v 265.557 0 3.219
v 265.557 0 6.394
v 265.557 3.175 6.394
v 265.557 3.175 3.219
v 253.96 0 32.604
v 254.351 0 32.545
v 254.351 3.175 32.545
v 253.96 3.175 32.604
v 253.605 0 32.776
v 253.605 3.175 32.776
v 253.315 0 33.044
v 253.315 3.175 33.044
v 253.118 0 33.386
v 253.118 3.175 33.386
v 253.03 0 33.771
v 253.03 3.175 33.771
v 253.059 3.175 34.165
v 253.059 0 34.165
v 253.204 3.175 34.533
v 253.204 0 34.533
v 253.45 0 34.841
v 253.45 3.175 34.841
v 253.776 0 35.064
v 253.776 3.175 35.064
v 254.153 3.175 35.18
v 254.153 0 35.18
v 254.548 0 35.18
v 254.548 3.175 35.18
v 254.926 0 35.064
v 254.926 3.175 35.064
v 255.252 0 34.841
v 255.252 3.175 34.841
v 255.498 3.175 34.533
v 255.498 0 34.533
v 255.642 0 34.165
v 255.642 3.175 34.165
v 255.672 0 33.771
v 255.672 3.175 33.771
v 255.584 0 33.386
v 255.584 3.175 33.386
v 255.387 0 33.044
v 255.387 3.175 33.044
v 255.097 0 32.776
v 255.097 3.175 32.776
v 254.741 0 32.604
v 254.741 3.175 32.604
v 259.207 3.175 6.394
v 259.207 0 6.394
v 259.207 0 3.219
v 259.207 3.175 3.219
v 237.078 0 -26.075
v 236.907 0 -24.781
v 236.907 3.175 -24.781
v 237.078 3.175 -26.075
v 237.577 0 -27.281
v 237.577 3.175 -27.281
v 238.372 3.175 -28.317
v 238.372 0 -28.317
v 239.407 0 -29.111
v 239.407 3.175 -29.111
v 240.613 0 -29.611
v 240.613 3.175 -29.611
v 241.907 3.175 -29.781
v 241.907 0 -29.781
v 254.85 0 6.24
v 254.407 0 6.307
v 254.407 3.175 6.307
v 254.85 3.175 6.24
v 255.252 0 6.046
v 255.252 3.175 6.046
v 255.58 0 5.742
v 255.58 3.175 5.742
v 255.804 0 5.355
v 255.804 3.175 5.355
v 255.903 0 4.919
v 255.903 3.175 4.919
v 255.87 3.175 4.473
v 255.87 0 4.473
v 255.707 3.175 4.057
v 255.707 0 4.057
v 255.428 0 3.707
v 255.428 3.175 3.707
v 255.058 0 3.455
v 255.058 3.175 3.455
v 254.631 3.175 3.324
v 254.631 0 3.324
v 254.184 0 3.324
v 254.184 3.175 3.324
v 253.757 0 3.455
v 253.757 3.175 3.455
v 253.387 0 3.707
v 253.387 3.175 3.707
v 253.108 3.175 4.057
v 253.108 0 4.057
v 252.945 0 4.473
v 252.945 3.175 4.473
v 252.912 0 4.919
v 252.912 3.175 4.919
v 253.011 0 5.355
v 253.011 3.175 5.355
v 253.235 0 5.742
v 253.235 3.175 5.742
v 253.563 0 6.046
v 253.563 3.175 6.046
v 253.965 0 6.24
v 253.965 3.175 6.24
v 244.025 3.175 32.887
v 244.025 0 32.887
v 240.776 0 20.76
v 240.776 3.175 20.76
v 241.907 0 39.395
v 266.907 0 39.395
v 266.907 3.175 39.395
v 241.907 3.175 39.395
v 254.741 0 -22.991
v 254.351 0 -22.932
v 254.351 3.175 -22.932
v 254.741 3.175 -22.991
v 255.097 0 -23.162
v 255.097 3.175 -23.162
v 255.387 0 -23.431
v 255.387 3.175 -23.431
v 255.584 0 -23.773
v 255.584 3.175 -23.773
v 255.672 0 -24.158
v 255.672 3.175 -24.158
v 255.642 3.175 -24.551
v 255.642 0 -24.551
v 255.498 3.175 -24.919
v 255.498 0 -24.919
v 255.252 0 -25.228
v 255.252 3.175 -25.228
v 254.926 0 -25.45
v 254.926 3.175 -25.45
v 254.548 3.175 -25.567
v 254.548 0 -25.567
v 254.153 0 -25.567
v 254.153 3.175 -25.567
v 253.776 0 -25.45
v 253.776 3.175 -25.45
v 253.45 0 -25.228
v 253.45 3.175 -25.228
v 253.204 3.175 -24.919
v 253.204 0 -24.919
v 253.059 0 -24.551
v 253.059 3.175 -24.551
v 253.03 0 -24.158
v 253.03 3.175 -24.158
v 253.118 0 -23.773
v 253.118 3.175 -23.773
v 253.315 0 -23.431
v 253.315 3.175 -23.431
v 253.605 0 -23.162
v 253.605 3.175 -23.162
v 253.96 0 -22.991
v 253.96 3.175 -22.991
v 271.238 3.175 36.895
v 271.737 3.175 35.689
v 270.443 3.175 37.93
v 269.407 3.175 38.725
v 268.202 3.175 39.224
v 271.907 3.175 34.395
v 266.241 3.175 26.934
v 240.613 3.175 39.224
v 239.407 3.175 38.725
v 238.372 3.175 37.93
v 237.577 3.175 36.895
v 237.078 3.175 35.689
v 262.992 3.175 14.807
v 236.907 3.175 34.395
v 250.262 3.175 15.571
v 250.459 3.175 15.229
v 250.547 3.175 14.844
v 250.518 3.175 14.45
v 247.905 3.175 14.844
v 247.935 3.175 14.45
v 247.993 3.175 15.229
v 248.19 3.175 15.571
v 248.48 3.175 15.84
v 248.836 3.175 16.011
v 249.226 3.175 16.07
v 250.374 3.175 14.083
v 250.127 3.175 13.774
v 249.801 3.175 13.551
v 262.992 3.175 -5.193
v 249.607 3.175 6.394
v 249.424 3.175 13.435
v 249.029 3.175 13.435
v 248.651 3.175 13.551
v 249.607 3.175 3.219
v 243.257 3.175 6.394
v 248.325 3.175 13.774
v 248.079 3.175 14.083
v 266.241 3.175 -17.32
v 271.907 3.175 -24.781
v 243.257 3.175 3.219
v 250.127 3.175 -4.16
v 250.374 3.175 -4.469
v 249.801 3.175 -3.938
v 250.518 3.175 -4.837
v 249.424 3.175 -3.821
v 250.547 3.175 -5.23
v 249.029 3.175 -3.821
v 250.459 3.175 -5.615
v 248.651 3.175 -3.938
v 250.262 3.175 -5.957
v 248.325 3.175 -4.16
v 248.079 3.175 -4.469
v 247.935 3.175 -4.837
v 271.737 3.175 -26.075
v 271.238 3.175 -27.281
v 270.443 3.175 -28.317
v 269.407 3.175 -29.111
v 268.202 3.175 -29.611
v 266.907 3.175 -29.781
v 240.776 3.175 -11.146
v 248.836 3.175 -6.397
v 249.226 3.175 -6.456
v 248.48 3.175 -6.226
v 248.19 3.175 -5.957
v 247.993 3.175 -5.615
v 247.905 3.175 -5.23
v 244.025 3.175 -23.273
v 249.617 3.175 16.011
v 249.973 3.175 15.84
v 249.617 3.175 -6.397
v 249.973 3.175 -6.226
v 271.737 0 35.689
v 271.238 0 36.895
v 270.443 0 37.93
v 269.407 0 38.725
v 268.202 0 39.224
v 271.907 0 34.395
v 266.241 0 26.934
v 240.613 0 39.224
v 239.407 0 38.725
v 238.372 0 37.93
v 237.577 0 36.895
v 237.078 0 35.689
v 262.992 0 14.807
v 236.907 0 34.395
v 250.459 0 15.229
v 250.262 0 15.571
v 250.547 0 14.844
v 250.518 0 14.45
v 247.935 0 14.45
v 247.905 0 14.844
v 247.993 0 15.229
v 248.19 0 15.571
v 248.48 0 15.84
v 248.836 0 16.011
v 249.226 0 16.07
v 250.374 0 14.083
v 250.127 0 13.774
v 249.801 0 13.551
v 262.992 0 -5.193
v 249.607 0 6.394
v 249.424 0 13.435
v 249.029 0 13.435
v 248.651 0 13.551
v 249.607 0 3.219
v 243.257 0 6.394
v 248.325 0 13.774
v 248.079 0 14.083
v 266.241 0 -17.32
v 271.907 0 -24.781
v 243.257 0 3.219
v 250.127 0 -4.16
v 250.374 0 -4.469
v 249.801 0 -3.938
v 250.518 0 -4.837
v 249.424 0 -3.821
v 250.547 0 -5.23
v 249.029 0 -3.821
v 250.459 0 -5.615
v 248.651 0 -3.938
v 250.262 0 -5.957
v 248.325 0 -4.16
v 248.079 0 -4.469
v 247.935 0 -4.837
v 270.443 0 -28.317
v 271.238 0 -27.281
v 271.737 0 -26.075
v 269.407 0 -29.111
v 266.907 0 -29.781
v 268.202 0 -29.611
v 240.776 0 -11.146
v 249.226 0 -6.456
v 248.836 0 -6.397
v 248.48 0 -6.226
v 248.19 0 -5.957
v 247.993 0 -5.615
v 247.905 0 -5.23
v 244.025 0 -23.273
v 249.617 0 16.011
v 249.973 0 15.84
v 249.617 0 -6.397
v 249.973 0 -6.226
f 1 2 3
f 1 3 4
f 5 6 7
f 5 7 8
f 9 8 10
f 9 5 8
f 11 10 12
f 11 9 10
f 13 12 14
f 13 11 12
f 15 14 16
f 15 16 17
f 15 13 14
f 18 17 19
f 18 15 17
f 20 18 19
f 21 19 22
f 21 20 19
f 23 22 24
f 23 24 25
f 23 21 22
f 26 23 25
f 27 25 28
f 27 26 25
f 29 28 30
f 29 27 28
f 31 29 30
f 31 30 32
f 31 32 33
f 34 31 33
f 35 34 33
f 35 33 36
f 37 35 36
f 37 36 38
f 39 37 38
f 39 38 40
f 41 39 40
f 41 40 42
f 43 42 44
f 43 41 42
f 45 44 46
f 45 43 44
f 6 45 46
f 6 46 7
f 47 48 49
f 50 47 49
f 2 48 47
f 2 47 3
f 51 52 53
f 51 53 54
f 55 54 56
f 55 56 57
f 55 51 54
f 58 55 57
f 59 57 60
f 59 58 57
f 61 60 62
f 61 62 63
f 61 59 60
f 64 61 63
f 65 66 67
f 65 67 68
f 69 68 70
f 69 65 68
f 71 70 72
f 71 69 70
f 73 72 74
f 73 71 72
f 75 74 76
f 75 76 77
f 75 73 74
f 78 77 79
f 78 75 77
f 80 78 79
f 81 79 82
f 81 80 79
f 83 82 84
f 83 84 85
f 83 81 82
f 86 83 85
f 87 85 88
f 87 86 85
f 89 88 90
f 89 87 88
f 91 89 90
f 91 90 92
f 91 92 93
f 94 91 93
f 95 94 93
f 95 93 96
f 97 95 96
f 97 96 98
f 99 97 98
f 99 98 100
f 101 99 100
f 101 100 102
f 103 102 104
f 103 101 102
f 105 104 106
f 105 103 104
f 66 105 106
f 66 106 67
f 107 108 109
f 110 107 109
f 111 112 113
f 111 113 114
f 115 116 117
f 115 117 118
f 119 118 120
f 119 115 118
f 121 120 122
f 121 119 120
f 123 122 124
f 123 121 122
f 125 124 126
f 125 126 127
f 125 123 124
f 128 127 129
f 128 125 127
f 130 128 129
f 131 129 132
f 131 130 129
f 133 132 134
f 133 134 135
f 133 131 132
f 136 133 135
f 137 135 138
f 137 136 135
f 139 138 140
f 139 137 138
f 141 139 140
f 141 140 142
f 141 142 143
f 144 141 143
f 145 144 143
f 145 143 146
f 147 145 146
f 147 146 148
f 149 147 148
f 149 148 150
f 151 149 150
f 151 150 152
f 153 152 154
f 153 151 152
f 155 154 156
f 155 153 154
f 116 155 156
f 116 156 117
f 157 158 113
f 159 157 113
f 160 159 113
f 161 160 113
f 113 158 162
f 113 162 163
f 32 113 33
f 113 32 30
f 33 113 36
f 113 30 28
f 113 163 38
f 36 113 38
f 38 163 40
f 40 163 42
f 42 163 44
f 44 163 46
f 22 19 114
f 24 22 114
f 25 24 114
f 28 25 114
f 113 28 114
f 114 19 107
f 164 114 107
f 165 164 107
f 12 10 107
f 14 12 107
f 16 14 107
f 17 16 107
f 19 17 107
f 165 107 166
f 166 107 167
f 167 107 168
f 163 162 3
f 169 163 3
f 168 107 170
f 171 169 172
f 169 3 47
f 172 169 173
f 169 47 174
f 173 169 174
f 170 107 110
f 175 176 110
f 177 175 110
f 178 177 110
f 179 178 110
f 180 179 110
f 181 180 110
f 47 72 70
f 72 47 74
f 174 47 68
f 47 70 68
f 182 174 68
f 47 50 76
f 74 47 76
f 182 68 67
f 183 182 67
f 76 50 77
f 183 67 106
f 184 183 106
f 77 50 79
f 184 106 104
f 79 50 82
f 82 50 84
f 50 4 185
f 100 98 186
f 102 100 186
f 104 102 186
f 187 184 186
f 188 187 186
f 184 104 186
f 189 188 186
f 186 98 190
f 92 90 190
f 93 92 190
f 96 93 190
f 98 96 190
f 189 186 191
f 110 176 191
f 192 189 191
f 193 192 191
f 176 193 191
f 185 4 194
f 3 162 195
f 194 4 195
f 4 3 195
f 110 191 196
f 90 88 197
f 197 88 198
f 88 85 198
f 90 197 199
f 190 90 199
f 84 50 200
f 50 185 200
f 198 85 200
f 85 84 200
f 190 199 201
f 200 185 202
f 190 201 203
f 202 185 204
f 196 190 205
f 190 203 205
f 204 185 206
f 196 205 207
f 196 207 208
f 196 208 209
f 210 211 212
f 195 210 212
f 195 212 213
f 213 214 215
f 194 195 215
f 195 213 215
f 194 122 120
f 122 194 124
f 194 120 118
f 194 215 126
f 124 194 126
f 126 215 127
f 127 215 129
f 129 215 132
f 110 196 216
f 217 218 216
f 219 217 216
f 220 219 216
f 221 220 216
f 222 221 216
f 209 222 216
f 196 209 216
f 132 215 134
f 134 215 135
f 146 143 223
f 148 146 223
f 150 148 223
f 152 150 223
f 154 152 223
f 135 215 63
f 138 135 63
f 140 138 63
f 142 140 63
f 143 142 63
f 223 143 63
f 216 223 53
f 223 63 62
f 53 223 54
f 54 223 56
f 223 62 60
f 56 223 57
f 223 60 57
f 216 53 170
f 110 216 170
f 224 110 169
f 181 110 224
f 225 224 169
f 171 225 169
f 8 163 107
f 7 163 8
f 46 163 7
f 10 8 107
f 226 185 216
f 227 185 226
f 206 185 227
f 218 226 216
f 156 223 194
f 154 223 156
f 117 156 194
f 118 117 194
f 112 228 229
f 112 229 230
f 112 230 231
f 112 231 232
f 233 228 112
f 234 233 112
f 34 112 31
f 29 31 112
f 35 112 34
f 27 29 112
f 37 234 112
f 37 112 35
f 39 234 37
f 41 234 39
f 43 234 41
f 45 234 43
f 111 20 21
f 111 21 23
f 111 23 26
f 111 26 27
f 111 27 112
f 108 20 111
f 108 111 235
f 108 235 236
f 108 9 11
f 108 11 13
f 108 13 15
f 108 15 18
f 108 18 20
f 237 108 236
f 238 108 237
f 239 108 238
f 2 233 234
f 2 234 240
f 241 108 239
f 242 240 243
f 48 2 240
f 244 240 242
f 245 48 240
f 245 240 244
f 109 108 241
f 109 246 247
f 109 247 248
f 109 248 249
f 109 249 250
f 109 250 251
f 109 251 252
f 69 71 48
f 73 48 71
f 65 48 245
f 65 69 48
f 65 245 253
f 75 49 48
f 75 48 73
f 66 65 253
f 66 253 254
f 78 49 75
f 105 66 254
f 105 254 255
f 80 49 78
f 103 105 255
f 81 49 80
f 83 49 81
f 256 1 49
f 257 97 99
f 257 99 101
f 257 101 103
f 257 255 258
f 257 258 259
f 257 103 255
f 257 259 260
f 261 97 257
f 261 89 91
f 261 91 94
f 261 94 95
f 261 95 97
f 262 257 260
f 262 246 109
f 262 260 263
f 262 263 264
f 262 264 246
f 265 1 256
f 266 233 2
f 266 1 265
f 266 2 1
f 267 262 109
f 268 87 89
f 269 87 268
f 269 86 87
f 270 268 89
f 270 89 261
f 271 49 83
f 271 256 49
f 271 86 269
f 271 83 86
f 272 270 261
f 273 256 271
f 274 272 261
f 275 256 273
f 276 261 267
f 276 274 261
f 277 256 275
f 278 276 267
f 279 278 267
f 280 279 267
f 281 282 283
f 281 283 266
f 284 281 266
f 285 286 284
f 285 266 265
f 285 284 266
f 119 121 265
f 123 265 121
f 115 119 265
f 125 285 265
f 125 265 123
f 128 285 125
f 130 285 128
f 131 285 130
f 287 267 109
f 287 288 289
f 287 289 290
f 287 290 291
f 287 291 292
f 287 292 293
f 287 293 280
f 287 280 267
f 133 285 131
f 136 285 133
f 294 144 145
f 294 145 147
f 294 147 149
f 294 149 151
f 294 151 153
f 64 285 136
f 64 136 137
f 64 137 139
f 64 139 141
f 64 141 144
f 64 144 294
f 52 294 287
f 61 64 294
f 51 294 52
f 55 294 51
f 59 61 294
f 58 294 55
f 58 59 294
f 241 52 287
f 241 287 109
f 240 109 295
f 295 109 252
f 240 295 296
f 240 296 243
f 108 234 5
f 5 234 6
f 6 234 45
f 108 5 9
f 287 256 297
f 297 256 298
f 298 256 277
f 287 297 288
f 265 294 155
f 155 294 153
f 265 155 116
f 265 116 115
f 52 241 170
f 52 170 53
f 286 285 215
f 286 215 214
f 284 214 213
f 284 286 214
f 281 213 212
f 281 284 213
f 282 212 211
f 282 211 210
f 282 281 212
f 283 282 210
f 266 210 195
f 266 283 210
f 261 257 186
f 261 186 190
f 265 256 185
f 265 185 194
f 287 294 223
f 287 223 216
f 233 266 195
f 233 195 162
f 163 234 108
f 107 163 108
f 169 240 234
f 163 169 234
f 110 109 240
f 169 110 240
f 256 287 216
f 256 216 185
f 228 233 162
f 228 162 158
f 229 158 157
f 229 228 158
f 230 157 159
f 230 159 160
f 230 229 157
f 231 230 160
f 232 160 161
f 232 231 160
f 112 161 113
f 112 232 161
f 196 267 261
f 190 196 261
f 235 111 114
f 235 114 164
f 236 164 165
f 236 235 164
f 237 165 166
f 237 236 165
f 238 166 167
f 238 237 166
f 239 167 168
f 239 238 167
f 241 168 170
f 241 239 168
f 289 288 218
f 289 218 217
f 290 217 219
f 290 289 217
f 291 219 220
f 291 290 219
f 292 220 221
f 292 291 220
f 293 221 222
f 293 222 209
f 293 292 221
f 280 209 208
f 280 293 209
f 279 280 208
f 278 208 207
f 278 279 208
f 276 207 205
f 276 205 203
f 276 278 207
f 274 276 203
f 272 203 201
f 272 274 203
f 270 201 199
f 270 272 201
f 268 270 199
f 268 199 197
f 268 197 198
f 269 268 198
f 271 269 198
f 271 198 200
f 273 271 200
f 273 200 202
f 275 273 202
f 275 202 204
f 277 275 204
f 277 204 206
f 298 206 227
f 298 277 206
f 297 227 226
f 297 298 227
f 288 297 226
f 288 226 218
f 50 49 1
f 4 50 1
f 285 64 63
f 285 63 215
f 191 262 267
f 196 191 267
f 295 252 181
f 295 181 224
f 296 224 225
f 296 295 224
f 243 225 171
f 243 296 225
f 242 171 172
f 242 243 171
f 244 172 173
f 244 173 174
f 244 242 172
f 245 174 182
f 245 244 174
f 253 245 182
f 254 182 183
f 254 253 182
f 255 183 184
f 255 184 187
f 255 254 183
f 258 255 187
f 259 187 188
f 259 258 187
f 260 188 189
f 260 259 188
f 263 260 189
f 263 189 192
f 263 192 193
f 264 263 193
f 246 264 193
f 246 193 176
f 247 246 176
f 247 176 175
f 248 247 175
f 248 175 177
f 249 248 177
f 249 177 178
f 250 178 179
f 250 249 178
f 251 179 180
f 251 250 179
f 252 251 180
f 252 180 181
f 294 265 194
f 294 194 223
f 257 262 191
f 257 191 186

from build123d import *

# Parameters (mm, degrees)
SKETCH1_R           = 1.324800001
SKETCH1_R_2         = 1.5
SKETCH1_W           = 6.35
SKETCH1_H           = 3.175
BOSS_EXTRUDE1_DEPTH = 3.175


with BuildPart() as part:
    # Sketch1 → Boss-Extrude1 (new body)
    with BuildSketch(Plane(origin=(0, 0, 0), x_dir=(1, 0, 0), z_dir=(0, 1, 0))):
        with BuildLine():
            Line((241.90748173, 29.781172289), (266.90748173, 29.781172289))
            ThreePointArc((266.90748173, 29.781172289), (270.443015636, 28.316706195), (271.90748173, 24.781172289))
            Line((271.90748173, 24.781172289), (271.90748173, -34.394734405))
            ThreePointArc((271.90748173, -34.394734405), (270.443015636, -37.930268311), (266.90748173, -39.394734405))
            Line((266.90748173, -39.394734405), (241.90748173, -39.394734405))
            ThreePointArc((241.90748173, -39.394734405), (238.371947824, -37.930268311), (236.90748173, -34.394734405))
            Line((236.90748173, -34.394734405), (236.90748173, 24.781172289))
            ThreePointArc((236.90748173, 24.781172289), (238.371947824, 28.316706195), (241.90748173, 29.781172289))
        make_face()
        with Locations(Location((254.350862197, 24.256669994, 0), (0, 0, 270))):
            Circle(SKETCH1_R, mode=Mode.SUBTRACT)
        with Locations(Location((249.226245104, 5.131338633, 0), (0, 0, 90))):
            Circle(SKETCH1_R, mode=Mode.SUBTRACT)
        with Locations(Location((249.226245104, -14.744900749, 0), (0, 0, 270))):
            Circle(SKETCH1_R, mode=Mode.SUBTRACT)
        with Locations(Location((254.350862197, -33.870232109, 0), (0, 0, 90))):
            Circle(SKETCH1_R, mode=Mode.SUBTRACT)
        with Locations(Location((254.40748173, -4.806781058, 0), (0, 0, 270))):
            Circle(SKETCH1_R_2, mode=Mode.SUBTRACT)
        Polygon((240.775666346, 11.14605698), (262.991960351, 5.193218942), (266.241381147, 17.32022245), (244.025087143, 23.273060488), align=None, mode=Mode.SUBTRACT)
        Polygon((262.991960351, -14.806781058), (266.241381147, -26.933784566), (244.025087143, -32.886622603), (240.775666346, -20.759619095), align=None, mode=Mode.SUBTRACT)
        with Locations((246.43248173, -4.806781058)):
            Rectangle(SKETCH1_W, SKETCH1_H, mode=Mode.SUBTRACT)
        with Locations((262.38248173, -4.806781058)):
            Rectangle(SKETCH1_W, SKETCH1_H, mode=Mode.SUBTRACT)
    extrude(amount=BOSS_EXTRUDE1_DEPTH)


solid = part.part
